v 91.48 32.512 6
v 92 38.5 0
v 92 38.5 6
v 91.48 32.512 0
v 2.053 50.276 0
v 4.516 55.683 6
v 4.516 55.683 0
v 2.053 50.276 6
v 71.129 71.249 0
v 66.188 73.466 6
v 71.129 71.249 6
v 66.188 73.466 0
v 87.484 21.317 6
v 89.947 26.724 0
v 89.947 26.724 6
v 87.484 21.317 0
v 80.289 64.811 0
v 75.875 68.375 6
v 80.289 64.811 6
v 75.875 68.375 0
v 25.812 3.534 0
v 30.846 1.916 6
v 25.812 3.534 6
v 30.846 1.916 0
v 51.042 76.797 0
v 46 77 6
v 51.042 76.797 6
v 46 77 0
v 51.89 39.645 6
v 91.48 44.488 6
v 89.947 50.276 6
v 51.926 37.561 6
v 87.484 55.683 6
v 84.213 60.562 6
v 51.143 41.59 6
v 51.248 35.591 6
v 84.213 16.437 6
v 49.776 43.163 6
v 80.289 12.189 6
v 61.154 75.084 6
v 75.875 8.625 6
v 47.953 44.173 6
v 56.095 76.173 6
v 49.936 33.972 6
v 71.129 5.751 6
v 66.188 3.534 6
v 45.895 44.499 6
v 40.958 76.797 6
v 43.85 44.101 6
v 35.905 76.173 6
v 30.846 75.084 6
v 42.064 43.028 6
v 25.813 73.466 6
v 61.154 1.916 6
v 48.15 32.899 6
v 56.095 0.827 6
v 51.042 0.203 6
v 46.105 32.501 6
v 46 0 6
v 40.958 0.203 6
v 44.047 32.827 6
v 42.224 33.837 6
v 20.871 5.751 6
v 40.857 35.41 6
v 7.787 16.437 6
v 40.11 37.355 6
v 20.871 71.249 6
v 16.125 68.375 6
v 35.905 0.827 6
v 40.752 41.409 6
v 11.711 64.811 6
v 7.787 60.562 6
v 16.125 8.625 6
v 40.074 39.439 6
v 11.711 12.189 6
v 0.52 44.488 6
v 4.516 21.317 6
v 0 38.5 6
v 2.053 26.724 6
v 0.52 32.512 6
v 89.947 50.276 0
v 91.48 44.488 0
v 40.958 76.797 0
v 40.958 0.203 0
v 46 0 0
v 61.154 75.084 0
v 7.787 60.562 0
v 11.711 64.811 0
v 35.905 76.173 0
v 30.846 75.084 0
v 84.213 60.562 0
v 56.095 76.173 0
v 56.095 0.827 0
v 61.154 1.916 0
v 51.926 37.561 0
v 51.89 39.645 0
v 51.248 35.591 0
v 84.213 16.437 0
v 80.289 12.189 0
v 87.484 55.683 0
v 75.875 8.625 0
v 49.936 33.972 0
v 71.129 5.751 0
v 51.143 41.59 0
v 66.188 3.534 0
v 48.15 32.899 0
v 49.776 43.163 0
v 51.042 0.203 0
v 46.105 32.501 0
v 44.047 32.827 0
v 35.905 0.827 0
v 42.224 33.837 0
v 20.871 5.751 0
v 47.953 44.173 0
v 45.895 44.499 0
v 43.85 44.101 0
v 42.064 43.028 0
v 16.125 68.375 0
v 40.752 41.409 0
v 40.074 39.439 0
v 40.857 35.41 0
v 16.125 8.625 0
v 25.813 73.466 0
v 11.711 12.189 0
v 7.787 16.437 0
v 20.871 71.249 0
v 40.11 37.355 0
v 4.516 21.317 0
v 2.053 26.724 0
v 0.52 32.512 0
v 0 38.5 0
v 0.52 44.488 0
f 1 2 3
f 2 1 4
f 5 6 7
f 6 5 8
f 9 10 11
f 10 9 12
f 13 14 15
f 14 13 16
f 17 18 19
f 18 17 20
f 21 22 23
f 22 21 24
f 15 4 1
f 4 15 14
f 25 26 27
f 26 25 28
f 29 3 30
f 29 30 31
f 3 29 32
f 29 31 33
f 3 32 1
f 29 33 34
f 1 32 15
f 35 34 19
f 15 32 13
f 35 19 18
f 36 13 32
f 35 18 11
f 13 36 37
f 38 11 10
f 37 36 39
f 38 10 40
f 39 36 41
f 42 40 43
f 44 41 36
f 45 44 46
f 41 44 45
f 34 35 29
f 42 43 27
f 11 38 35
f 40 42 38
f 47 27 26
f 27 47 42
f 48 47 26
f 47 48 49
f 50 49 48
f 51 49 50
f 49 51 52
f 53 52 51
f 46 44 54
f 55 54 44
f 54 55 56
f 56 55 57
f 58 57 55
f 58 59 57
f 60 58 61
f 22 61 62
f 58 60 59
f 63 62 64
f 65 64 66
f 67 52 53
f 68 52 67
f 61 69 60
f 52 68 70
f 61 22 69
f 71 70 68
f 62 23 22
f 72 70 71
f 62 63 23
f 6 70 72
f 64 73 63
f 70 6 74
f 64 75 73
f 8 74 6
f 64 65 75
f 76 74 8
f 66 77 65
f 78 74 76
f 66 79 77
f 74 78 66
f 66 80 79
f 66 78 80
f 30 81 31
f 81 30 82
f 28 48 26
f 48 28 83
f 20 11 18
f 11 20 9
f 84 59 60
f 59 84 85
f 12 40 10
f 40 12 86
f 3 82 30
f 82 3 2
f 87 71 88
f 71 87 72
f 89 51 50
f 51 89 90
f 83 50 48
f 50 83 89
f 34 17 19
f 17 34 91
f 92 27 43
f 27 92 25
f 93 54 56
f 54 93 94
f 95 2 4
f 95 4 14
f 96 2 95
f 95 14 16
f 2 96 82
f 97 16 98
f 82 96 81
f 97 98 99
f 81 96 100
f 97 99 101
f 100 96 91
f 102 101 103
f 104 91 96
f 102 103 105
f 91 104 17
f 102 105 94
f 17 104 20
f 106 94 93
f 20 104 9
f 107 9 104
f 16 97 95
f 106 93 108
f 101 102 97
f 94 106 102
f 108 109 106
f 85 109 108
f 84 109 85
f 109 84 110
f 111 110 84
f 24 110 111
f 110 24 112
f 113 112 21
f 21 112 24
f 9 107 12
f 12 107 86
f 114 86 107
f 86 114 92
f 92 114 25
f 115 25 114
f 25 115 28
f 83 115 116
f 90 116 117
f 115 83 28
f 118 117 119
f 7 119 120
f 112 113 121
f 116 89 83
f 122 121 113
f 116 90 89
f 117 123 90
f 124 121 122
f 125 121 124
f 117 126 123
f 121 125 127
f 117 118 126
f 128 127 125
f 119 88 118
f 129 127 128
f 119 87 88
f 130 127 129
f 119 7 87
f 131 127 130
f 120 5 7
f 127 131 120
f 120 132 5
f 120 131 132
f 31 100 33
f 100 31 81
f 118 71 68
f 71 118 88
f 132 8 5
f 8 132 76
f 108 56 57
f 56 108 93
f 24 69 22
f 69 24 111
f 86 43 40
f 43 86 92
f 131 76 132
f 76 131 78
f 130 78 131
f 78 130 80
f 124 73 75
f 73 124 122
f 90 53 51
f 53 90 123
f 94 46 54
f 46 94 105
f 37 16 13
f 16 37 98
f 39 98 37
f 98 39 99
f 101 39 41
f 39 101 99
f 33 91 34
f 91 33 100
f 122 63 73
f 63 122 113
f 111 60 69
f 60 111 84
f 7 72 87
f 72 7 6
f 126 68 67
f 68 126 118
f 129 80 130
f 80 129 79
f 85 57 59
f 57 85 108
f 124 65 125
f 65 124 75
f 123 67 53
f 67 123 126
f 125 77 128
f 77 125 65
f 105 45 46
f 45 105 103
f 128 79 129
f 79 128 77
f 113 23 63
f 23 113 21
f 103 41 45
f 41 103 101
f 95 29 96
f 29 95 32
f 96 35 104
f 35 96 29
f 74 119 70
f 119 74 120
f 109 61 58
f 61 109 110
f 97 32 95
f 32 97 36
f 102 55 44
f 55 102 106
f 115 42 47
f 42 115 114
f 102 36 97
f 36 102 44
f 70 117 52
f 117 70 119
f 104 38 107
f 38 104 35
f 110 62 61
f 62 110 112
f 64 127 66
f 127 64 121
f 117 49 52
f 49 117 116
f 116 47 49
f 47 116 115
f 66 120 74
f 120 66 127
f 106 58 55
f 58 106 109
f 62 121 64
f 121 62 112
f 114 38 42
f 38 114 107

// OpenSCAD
$fn = 32;

// ----------------------------------------------------------------------
// Cam plate: double_lobe cam, base R36
// ----------------------------------------------------------------------

// --- parameters (mm) ---
base_r = 36;              // base circle radius
lobe_h = 10;              // cam lobe rise
bore_r = 6;               // shaft bore radius
plate_t = 6;              // plate thickness, Z (extrusion height)

profile = [[92, 38.5], [91.48, 44.488], [89.947, 50.276], [87.484, 55.683], [84.213, 60.562], [80.289, 64.811], [75.875, 68.375], [71.129, 71.249], [66.188, 73.466], [61.154, 75.084], [56.095, 76.173], [51.042, 76.797], [46, 77], [40.958, 76.797], [35.905, 76.173], [30.846, 75.084], [25.813, 73.466], [20.871, 71.249], [16.125, 68.375], [11.711, 64.811], [7.787, 60.562], [4.516, 55.683], [2.053, 50.276], [0.52, 44.488], [0, 38.5], [0.52, 32.512], [2.053, 26.724], [4.516, 21.317], [7.787, 16.437], [11.711, 12.189], [16.125, 8.625], [20.871, 5.751], [25.812, 3.534], [30.846, 1.916], [35.905, 0.827], [40.958, 0.203], [46, 0], [51.042, 0.203], [56.095, 0.827], [61.154, 1.916], [66.188, 3.534], [71.129, 5.751], [75.875, 8.625], [80.289, 12.189], [84.213, 16.437], [87.484, 21.317], [89.947, 26.724], [91.48, 32.512]];  // primary outline, 48 points, counter clockwise
void_1 = [[51.89, 39.645], [51.143, 41.59], [49.776, 43.163], [47.953, 44.173], [45.895, 44.499], [43.85, 44.101], [42.064, 43.028], [40.752, 41.409], [40.074, 39.439], [40.11, 37.355], [40.857, 35.41], [42.224, 33.837], [44.047, 32.827], [46.105, 32.501], [48.15, 32.899], [49.936, 33.972], [51.248, 35.591], [51.926, 37.561]];  // shaft bore, 18 points

// --- the one profile operation ---
difference() {
  linear_extrude(height = plate_t) polygon(points = profile);
  translate([0, 0, -1])
    linear_extrude(height = plate_t + 2) polygon(points = void_1);
}
